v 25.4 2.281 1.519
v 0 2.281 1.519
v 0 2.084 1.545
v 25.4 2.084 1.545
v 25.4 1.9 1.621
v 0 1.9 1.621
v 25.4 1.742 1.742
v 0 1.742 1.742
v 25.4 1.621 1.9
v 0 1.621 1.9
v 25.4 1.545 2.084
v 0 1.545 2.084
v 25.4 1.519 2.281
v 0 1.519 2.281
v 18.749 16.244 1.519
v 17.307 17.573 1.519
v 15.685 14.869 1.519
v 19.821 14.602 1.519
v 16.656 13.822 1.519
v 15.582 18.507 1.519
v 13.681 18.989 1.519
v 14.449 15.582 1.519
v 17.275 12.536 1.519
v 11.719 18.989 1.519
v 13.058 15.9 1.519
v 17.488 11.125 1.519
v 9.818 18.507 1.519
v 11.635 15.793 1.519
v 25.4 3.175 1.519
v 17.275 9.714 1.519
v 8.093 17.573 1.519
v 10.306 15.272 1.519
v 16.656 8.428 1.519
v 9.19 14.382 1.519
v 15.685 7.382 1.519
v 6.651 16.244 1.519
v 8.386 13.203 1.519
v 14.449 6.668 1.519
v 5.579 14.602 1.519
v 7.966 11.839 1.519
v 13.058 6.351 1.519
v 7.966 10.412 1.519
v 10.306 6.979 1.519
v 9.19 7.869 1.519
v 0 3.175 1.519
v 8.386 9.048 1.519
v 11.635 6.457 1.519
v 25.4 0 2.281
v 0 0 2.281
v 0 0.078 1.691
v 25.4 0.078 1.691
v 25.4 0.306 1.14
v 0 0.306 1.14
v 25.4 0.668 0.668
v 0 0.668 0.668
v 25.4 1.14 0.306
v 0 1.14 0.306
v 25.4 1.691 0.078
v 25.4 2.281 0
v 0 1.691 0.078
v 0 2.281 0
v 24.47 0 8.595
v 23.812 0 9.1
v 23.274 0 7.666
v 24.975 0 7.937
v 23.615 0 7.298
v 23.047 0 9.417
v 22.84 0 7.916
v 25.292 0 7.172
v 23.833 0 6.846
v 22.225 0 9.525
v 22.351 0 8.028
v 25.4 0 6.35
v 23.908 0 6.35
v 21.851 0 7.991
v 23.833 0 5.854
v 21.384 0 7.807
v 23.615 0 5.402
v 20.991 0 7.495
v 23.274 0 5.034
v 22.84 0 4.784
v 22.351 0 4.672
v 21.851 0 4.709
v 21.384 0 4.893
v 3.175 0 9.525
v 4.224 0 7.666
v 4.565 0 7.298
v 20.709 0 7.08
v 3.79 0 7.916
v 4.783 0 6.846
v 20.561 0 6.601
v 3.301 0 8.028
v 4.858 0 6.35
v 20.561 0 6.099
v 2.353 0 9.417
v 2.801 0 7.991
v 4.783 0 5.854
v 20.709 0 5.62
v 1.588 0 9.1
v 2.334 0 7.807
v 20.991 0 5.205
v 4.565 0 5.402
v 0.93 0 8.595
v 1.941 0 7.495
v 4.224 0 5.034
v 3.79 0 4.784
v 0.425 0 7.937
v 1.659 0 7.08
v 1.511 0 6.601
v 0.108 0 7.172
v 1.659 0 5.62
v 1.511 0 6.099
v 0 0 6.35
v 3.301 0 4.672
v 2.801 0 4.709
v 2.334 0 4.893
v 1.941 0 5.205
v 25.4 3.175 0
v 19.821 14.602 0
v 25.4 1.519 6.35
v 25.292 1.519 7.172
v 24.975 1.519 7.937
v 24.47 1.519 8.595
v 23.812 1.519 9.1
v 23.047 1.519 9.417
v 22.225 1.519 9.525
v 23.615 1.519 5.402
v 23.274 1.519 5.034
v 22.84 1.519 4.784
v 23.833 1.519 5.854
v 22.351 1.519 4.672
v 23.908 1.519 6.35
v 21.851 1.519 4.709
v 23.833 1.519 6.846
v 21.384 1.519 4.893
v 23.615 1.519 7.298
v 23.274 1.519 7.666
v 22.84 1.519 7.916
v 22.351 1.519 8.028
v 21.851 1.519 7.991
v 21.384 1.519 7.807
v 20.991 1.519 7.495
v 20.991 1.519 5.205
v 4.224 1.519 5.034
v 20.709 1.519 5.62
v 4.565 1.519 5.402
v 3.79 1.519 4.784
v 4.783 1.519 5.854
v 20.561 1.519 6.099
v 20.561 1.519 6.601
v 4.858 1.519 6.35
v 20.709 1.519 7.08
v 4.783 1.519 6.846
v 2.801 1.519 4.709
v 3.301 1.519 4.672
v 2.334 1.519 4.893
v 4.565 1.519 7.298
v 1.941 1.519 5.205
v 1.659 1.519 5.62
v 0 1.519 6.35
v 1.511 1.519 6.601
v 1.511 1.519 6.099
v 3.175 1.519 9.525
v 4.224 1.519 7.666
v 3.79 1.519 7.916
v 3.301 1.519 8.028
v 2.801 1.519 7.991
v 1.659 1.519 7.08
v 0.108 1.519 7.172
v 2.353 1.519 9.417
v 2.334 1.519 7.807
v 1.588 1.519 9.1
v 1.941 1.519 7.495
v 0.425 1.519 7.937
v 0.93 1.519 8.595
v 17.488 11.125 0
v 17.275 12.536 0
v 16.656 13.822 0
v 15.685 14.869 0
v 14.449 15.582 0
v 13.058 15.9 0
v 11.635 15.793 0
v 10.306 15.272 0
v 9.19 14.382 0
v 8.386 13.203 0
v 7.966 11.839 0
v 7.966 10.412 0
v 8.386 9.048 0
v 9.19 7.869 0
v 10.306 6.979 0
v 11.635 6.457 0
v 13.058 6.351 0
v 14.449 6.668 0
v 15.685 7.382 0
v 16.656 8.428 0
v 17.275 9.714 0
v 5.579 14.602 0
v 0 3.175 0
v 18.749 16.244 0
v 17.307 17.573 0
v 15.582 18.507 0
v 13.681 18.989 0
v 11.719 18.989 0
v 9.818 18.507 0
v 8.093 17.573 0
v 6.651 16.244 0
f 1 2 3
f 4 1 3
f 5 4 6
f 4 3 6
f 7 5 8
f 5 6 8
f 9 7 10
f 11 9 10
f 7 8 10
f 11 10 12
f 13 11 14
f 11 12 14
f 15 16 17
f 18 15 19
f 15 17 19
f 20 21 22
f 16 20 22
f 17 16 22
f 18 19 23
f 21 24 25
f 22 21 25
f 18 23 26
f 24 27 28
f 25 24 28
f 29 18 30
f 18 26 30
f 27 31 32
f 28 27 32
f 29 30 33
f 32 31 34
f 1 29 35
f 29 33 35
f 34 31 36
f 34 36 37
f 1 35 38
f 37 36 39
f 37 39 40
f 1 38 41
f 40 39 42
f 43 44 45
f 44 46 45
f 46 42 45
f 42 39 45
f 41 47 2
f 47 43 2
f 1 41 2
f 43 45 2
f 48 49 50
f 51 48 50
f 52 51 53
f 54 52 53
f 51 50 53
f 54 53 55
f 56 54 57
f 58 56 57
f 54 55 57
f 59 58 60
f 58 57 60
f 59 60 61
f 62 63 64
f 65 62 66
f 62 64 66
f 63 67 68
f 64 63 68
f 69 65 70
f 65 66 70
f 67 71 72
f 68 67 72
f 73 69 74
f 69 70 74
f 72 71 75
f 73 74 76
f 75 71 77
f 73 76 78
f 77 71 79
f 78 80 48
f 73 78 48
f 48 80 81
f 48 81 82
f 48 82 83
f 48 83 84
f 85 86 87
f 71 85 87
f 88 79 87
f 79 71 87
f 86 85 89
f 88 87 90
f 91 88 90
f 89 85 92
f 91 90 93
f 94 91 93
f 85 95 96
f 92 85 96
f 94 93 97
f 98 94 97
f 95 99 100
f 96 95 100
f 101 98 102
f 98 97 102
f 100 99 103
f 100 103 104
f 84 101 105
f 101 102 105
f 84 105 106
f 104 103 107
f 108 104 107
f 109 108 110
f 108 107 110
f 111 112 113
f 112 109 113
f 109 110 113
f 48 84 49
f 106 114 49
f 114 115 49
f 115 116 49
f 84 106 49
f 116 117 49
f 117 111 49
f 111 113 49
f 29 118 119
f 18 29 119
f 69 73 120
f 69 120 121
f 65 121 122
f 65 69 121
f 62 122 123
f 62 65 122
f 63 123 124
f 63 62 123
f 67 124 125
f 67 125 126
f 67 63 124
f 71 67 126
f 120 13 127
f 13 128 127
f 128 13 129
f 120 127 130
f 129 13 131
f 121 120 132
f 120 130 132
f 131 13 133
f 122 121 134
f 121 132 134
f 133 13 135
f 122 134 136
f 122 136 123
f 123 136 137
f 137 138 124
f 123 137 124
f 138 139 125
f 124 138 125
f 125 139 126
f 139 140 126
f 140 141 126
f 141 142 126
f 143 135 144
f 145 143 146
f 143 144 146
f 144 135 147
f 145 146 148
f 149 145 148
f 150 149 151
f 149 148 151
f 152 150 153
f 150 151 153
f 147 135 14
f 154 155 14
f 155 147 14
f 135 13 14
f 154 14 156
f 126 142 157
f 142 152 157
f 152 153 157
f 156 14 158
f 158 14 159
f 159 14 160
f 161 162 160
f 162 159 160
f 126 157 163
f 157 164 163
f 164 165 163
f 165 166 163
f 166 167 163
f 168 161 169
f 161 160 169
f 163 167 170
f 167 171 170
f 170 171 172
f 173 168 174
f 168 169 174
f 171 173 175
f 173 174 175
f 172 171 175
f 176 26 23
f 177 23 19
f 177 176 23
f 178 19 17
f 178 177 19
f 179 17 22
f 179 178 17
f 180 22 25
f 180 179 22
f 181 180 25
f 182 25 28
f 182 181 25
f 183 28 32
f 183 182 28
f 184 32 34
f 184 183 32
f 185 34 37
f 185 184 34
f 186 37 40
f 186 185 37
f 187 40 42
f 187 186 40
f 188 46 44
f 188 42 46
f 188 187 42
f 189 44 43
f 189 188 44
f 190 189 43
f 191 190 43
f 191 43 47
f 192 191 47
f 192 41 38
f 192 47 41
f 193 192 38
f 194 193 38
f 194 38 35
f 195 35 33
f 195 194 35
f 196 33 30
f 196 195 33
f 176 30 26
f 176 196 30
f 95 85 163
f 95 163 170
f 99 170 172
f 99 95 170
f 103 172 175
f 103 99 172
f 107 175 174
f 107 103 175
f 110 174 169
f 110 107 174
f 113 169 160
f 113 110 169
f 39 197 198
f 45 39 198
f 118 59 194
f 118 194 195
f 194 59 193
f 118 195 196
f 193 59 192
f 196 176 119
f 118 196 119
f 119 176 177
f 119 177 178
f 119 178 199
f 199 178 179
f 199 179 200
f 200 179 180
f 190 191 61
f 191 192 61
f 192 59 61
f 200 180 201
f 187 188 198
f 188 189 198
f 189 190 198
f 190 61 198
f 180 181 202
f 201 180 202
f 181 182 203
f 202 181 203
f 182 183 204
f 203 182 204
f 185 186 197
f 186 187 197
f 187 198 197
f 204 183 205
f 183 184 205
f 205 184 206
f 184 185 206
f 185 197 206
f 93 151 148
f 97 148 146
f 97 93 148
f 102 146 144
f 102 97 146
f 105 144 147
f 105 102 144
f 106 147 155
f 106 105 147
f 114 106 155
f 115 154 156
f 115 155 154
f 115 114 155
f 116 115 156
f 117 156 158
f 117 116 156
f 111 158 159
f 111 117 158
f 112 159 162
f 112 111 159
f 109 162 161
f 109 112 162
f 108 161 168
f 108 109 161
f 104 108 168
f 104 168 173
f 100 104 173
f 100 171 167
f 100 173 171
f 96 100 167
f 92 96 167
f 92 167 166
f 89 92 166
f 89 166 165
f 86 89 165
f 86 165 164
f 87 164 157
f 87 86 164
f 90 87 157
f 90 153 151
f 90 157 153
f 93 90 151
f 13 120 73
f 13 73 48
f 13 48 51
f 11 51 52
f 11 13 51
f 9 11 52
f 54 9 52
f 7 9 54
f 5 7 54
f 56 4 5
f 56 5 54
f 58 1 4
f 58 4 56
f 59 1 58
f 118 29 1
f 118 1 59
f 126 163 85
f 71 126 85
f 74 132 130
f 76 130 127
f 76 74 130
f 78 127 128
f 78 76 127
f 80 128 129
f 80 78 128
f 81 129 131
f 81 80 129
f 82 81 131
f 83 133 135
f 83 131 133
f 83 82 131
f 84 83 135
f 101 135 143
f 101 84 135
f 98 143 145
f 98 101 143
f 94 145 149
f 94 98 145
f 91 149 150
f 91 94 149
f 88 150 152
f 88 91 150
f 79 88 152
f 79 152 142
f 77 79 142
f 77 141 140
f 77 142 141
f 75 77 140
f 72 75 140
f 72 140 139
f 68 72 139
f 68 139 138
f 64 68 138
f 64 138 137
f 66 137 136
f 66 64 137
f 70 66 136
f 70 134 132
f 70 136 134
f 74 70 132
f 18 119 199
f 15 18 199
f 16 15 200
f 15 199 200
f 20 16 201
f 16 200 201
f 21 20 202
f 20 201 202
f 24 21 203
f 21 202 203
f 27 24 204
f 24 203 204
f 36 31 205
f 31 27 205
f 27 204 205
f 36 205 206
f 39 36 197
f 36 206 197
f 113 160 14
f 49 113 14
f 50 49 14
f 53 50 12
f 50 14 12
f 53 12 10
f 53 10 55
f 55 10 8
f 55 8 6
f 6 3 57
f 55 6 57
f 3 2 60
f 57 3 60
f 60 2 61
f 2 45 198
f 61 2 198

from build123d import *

# Parameters (mm, degrees)
BOSS_EXTRUDE1_DEPTH = 25.4
SKETCH2_W           = 35.56
SKETCH2_H           = 32.385
CUT_EXTRUDE1_DEPTH  = 2.27838
SKETCH3_R           = 4.7879
CUT_EXTRUDE2_DEPTH  = 2.27838
SKETCH4_R           = 1.68275
CUT_EXTRUDE3_DEPTH  = 2.27838
SKETCH5_R           = 1.68275
CUT_EXTRUDE4_DEPTH  = 2.27838
CUT_EXTRUDE5_DEPTH  = 2.27838
CUT_EXTRUDE6_DEPTH  = 2.27838


with BuildPart() as part:
    # Sketch1 → Boss-Extrude1 (new body)
    with BuildSketch(Plane(origin=(0, 0, 0), x_dir=(0, 0, -1), z_dir=(1, 0, 0))):
        with BuildLine():
            Line((-9.525, 1.51892), (-9.525, 0))
            Line((-9.525, 0), (-2.28092, 0))
            ThreePointArc((-2.28092, 0), (-0.668066001, 0.668066001), (0, 2.28092))
            Line((0, 2.28092), (0, 22.86))
            Line((0, 22.86), (-1.51892, 22.86))
            Line((-1.51892, 22.86), (-1.51892, 2.28092))
            ThreePointArc((-1.51892, 2.28092), (-1.742104633, 1.742104633), (-2.28092, 1.51892))
            Line((-2.28092, 1.51892), (-9.525, 1.51892))
        make_face()
    extrude(amount=BOSS_EXTRUDE1_DEPTH)

    # Sketch2 → Cut-Extrude1 (cut)
    with BuildSketch(Plane.XY):
        with Locations((12.7, 14.2875)):
            Rectangle(SKETCH2_W, SKETCH2_H)
        with BuildLine():
            Line((-1.550018352, 0), (26.950018352, 0))
            Line((26.950018352, 0), (19.821465766, 14.601862247))
            ThreePointArc((19.821465766, 14.601862247), (12.7, 19.05), (5.578534234, 14.601862247))
            Line((5.578534234, 14.601862247), (-1.550018352, 0))
        make_face(mode=Mode.SUBTRACT)
    extrude(amount=CUT_EXTRUDE1_DEPTH, mode=Mode.SUBTRACT)

    # Sketch3 → Cut-Extrude2 (cut)
    with BuildSketch(Plane.XY):
        with Locations((12.7, 11.1252)):
            Circle(SKETCH3_R)
    extrude(amount=CUT_EXTRUDE2_DEPTH, mode=Mode.SUBTRACT)

    # Sketch4 → Cut-Extrude3 (cut)
    with BuildSketch(Plane(origin=(0, 0, 0), x_dir=(1, 0, 0), z_dir=(0, 1, 0))):
        with Locations((3.175, -6.35)):
            Circle(SKETCH4_R)
    extrude(amount=CUT_EXTRUDE3_DEPTH, mode=Mode.SUBTRACT)

    # Sketch5 → Cut-Extrude4 (cut)
    with BuildSketch(Plane(origin=(0, 0, 0), x_dir=(1, 0, 0), z_dir=(0, 1, 0))):
        with Locations((22.225, -6.35)):
            Circle(SKETCH5_R)
    extrude(amount=CUT_EXTRUDE4_DEPTH, mode=Mode.SUBTRACT)

    # Sketch6 → Cut-Extrude5 (cut)
    with BuildSketch(Plane(origin=(0, 0, 0), x_dir=(1, 0, 0), z_dir=(0, 1, 0))):
        with BuildLine():
            Line((-12.7, -12.7), (3.175, -12.7))
            Line((3.175, -12.7), (3.175, -9.525))
            ThreePointArc((3.175, -9.525), (0.92993597, -8.59506403), (0, -6.35))
            Line((0, -6.35), (-12.7, -6.35))
            Line((-12.7, -6.35), (-12.7, -12.7))
        make_face()
    extrude(amount=CUT_EXTRUDE5_DEPTH, mode=Mode.SUBTRACT)

    # Sketch7 → Cut-Extrude6 (cut)
    with BuildSketch(Plane(origin=(0, 0, 0), x_dir=(1, 0, 0), z_dir=(0, 1, 0))):
        with BuildLine():
            Line((22.225, -9.525), (22.225, -12.7))
            Line((22.225, -12.7), (38.1, -12.7))
            Line((38.1, -12.7), (38.1, -6.35))
            Line((38.1, -6.35), (25.4, -6.35))
            ThreePointArc((25.4, -6.35), (24.47006403, -8.59506403), (22.225, -9.525))
        make_face()
    extrude(amount=CUT_EXTRUDE6_DEPTH, mode=Mode.SUBTRACT)


solid = part.part
